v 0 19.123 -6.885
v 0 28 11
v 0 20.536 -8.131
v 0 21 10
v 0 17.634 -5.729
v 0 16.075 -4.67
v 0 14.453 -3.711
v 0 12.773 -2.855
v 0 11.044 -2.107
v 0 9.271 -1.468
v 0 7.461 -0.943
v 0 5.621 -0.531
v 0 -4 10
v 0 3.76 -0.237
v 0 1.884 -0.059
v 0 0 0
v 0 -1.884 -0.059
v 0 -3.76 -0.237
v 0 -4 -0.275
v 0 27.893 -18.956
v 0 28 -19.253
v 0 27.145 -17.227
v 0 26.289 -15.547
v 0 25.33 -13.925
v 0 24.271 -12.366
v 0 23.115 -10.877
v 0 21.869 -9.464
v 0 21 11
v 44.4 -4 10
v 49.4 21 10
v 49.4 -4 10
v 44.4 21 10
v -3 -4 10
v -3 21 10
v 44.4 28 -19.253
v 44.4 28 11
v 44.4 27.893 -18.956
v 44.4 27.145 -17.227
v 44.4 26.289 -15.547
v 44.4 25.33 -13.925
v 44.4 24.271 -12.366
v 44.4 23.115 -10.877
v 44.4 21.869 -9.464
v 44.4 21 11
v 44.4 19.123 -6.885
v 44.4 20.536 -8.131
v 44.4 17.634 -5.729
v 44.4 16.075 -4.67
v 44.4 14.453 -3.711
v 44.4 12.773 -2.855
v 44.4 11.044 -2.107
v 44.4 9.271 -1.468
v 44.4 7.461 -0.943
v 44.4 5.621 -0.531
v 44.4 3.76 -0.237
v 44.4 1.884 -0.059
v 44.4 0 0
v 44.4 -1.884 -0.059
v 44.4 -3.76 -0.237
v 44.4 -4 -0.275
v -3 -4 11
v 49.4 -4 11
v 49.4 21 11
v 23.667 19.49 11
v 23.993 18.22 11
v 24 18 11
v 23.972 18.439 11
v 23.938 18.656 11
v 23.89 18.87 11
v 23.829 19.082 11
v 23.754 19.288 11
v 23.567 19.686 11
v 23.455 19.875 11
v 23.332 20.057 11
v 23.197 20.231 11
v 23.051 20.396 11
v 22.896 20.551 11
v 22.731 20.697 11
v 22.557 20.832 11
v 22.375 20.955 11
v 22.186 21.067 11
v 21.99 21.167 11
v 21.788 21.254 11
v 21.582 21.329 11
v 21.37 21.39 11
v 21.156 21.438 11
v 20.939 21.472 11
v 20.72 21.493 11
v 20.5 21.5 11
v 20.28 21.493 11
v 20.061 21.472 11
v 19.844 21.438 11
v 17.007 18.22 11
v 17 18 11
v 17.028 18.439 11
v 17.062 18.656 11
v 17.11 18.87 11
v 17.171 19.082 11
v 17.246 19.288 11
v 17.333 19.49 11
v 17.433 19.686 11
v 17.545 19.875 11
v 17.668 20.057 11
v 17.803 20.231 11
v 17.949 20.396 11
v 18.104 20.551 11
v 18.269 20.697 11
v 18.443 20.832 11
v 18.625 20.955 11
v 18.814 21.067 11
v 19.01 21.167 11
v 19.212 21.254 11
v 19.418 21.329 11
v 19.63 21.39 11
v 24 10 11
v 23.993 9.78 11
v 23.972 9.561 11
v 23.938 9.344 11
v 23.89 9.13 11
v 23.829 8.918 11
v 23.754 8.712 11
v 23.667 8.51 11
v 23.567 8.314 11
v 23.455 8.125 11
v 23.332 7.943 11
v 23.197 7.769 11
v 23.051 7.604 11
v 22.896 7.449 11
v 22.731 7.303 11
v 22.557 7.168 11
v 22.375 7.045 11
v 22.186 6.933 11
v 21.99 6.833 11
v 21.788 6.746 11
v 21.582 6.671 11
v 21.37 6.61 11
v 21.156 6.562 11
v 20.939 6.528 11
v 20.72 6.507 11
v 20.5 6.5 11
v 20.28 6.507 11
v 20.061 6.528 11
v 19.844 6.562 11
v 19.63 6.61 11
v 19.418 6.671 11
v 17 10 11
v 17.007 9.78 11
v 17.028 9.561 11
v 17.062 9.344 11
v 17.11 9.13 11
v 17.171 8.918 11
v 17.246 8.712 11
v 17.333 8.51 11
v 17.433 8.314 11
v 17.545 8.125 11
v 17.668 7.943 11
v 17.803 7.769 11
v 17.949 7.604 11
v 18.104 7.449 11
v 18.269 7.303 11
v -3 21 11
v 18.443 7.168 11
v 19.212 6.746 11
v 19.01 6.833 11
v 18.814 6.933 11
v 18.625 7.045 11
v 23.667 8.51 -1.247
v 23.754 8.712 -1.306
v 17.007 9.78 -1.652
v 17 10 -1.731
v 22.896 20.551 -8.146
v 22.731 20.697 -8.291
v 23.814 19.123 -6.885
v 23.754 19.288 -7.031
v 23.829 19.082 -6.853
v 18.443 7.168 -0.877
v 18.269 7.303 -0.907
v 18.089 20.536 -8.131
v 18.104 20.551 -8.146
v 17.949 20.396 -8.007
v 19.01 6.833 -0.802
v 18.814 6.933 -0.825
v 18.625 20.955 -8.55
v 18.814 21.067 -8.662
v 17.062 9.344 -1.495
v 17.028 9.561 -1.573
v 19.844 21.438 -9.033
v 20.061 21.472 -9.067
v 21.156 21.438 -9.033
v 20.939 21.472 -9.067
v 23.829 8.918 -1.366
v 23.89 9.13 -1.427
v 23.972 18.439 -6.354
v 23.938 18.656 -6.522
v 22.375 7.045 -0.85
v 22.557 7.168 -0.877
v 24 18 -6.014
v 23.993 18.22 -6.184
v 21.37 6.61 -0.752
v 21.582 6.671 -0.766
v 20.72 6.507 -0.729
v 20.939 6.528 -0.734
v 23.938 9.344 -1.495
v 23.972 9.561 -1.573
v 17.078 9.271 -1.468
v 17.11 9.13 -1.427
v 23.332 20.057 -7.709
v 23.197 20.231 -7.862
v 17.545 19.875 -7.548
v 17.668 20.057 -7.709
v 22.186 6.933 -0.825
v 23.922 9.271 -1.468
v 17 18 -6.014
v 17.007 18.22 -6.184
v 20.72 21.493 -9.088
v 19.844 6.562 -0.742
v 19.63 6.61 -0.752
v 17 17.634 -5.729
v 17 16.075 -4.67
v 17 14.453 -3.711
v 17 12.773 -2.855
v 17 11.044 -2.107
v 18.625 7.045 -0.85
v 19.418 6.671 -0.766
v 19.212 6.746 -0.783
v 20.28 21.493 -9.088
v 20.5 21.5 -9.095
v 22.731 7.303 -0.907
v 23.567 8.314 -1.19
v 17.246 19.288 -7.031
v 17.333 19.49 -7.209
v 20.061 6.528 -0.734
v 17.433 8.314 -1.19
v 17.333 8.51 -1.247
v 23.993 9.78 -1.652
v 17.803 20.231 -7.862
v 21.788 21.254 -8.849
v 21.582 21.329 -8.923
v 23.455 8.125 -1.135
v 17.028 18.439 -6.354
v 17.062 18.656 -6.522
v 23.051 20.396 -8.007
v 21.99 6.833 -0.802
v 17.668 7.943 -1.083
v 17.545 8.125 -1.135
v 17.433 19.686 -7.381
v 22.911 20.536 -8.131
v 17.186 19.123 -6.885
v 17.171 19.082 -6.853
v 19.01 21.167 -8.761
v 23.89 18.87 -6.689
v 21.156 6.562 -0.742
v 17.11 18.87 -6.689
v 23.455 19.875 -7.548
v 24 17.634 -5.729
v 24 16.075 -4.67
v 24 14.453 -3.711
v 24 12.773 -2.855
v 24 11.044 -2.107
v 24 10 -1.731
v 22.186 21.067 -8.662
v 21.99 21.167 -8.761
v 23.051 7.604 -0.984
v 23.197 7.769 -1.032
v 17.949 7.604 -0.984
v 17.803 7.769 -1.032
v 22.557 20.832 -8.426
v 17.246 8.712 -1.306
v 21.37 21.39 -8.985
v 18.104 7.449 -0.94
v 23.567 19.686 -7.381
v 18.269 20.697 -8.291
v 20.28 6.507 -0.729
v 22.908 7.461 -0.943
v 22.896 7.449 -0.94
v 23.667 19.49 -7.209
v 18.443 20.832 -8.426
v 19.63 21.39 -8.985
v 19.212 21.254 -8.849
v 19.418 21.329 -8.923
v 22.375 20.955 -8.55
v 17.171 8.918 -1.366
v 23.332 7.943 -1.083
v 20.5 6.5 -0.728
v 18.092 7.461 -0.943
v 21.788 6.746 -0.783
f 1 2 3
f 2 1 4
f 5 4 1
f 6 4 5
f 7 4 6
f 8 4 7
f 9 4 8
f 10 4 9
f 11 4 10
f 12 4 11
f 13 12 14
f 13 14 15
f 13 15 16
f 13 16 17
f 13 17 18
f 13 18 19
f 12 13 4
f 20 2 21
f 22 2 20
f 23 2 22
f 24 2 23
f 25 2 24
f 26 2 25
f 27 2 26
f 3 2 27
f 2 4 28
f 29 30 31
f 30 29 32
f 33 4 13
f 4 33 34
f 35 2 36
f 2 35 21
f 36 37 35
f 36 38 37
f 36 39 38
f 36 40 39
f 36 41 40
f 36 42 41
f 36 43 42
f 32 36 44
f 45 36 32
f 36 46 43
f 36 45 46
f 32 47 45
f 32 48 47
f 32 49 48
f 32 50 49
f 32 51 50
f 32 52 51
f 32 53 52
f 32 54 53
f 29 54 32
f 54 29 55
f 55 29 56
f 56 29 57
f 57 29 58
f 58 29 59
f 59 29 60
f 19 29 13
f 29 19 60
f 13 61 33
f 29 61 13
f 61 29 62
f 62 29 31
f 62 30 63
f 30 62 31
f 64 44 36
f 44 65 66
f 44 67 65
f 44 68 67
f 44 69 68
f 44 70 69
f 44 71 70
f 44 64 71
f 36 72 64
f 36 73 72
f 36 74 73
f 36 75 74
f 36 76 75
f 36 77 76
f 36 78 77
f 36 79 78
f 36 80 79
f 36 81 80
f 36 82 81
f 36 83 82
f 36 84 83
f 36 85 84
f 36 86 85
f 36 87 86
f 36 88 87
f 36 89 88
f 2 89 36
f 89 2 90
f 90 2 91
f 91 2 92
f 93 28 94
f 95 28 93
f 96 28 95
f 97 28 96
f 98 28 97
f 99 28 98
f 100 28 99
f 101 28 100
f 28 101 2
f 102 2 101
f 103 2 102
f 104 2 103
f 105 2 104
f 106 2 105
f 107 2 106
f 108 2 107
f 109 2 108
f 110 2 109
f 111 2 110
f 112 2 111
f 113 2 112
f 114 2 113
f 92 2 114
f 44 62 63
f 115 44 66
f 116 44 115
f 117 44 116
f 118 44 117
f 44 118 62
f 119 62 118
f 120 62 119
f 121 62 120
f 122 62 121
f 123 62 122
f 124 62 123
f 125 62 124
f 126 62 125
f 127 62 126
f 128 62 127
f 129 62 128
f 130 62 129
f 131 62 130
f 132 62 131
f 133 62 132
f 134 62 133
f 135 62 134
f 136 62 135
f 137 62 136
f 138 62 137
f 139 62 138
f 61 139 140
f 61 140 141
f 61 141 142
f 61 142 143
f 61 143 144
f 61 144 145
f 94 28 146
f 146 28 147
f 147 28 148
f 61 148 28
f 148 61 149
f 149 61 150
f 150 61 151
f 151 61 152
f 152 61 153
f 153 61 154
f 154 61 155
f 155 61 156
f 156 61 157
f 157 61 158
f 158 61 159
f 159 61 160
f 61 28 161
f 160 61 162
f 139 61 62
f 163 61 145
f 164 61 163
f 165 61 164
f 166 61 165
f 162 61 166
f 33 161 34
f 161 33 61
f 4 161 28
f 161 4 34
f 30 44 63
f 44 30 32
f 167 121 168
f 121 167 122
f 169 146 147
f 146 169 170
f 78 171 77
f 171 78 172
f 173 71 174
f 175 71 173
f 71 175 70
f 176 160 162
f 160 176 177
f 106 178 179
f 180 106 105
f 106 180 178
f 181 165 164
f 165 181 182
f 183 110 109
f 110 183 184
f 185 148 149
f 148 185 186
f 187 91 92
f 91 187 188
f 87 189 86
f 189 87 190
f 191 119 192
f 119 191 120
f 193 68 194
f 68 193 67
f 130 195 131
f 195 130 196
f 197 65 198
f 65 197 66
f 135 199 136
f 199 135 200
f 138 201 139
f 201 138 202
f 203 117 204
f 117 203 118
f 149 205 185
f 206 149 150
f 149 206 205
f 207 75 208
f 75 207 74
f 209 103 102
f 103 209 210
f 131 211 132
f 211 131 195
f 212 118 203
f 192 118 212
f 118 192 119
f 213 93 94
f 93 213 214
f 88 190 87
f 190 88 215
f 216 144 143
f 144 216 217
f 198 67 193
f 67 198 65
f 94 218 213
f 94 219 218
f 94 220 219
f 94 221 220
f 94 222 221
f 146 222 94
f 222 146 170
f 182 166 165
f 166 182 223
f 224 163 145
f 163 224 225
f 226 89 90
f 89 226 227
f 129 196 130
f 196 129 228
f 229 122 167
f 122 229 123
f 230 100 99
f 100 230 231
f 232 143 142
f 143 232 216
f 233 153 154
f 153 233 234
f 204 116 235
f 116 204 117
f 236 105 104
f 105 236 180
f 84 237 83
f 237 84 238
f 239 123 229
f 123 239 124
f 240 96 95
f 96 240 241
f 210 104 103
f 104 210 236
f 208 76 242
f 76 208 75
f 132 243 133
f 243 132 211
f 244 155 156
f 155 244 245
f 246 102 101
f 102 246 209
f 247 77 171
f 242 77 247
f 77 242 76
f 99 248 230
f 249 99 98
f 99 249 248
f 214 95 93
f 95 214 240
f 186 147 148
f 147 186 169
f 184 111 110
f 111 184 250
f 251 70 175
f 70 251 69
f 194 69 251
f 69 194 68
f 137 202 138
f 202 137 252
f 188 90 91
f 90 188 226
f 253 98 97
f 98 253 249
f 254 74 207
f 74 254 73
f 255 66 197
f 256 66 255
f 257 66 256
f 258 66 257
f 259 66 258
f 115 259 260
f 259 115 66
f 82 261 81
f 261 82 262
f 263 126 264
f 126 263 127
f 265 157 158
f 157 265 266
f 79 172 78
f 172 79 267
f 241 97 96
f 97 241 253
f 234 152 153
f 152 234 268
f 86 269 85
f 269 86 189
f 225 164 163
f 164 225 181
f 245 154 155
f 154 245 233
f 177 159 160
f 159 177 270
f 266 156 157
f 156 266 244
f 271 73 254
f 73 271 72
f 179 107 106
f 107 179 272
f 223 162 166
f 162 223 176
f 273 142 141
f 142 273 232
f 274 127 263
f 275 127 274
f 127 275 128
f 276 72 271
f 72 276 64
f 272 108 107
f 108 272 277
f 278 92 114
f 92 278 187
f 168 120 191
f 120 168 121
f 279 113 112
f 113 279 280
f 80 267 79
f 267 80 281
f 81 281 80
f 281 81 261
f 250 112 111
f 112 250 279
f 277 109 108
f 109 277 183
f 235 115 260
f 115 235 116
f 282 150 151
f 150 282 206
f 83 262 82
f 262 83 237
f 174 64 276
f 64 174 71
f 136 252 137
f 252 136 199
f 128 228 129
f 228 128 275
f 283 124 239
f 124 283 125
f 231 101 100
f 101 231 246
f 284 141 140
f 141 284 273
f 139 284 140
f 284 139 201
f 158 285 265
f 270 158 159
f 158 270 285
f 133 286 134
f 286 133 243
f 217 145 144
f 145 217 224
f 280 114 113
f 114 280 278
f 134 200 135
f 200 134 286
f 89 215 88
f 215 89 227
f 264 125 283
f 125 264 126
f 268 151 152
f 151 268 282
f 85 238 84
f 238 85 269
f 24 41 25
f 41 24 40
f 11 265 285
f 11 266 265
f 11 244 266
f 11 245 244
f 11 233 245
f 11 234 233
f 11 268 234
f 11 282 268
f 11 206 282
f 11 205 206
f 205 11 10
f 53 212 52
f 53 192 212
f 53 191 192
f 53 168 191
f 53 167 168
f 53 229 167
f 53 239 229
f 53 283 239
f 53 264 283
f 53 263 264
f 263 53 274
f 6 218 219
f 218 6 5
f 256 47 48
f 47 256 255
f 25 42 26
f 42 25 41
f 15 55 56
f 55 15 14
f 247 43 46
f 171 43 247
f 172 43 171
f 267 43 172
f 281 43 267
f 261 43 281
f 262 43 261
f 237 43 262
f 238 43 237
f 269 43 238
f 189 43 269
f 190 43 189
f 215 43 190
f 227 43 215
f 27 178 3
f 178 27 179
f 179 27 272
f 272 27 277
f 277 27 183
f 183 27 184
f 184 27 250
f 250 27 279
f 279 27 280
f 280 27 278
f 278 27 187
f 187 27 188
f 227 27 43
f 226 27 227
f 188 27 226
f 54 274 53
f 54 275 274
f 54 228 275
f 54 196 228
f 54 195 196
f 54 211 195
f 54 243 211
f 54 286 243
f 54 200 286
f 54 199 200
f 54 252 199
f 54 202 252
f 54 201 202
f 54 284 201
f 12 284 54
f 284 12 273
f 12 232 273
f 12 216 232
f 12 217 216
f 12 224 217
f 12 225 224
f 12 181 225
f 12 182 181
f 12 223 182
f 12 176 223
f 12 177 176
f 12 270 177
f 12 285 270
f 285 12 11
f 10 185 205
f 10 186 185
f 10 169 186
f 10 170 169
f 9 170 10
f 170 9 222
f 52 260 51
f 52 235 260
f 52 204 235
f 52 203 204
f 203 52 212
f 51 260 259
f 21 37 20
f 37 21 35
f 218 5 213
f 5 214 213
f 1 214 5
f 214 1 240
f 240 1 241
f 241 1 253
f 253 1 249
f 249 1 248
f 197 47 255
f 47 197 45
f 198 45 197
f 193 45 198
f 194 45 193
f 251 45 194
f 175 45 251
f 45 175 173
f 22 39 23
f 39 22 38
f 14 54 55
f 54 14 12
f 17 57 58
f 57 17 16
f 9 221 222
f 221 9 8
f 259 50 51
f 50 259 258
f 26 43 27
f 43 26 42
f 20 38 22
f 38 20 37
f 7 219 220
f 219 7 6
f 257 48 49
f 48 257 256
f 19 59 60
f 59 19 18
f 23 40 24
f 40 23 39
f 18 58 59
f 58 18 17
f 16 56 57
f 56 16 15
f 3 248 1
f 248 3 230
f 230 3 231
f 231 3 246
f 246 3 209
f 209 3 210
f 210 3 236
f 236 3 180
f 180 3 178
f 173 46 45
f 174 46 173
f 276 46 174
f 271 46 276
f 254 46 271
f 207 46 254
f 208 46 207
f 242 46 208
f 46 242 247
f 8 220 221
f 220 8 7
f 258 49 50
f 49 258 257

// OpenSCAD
// file: ../../modules/translate-hull-each.scad
module translate_hull_each(vec) for(idx = [0 : $children - 1]) hull() {
  children(idx);
  translate(vec) children(idx);
}
// main file
use <../../modules/translate-hull-each.scad>

$fn = 100;

width = 44.4;
radius = 30;

difference() {
  translate([0, -4, 10 - radius]) {
    linear_extrude(height = radius) square([width, 32]);

    translate([-3, 0, radius]) cube([width + 8, 25, 1]);
    translate([0, 25, radius]) cube([width, 7, 1]);
  }

  translate([20.5, 10, 10 - radius + 1.1]) translate_hull_each([0, 8])
    cylinder(d = 7, h = radius);

  translate([-0.1, 0, -radius]) rotate([0, 90]) cylinder(r = radius, h = width + 0.2);
}
